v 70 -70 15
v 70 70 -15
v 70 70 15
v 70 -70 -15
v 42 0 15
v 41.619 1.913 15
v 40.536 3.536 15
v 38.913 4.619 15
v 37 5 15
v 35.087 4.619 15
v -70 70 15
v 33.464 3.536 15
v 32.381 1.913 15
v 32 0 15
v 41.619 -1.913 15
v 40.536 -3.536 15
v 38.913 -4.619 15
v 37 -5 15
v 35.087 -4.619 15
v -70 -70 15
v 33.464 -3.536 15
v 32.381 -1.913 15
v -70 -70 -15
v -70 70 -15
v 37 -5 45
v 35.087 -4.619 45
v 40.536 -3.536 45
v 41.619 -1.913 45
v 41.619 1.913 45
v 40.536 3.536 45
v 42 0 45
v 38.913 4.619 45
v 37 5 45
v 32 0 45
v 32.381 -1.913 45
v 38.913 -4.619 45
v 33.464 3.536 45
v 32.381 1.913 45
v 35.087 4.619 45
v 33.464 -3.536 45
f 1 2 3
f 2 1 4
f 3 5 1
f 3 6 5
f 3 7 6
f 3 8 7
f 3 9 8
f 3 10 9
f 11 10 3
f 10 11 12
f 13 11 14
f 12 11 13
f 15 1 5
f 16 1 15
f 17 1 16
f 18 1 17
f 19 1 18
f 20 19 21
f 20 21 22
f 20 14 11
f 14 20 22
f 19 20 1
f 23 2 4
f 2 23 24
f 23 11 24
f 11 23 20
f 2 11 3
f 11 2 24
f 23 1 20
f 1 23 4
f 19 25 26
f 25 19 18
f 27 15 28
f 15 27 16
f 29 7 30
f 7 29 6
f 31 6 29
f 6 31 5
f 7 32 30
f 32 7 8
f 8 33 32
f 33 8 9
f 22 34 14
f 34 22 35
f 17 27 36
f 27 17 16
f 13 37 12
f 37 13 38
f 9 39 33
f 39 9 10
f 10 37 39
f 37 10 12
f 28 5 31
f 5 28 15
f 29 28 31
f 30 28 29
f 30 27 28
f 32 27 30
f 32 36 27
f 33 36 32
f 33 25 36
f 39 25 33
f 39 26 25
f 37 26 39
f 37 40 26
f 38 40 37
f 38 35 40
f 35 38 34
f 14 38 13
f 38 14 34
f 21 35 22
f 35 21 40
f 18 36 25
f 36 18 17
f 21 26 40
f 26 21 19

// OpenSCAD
// CSG.scad - Basic example of CSG usage

translate([0,0,0]) {
    cube([140, 140, 30], center=true);
} 

translate([37,0,15]) {
    cylinder(h=60, r=5, center=true);
}



echo(version=version());
// Written by Marius Kintel <marius@kintel.net>
//
// To the extent possible under law, the author(s) have dedicated all
// copyright and related and neighboring rights to this software to the
// public domain worldwide. This software is distributed without any
// warranty.
//
// You should have received a copy of the CC0 Public Domain
// Dedication along with this software.
// If not, see <http://creativecommons.org/publicdomain/zero/1.0/>.
